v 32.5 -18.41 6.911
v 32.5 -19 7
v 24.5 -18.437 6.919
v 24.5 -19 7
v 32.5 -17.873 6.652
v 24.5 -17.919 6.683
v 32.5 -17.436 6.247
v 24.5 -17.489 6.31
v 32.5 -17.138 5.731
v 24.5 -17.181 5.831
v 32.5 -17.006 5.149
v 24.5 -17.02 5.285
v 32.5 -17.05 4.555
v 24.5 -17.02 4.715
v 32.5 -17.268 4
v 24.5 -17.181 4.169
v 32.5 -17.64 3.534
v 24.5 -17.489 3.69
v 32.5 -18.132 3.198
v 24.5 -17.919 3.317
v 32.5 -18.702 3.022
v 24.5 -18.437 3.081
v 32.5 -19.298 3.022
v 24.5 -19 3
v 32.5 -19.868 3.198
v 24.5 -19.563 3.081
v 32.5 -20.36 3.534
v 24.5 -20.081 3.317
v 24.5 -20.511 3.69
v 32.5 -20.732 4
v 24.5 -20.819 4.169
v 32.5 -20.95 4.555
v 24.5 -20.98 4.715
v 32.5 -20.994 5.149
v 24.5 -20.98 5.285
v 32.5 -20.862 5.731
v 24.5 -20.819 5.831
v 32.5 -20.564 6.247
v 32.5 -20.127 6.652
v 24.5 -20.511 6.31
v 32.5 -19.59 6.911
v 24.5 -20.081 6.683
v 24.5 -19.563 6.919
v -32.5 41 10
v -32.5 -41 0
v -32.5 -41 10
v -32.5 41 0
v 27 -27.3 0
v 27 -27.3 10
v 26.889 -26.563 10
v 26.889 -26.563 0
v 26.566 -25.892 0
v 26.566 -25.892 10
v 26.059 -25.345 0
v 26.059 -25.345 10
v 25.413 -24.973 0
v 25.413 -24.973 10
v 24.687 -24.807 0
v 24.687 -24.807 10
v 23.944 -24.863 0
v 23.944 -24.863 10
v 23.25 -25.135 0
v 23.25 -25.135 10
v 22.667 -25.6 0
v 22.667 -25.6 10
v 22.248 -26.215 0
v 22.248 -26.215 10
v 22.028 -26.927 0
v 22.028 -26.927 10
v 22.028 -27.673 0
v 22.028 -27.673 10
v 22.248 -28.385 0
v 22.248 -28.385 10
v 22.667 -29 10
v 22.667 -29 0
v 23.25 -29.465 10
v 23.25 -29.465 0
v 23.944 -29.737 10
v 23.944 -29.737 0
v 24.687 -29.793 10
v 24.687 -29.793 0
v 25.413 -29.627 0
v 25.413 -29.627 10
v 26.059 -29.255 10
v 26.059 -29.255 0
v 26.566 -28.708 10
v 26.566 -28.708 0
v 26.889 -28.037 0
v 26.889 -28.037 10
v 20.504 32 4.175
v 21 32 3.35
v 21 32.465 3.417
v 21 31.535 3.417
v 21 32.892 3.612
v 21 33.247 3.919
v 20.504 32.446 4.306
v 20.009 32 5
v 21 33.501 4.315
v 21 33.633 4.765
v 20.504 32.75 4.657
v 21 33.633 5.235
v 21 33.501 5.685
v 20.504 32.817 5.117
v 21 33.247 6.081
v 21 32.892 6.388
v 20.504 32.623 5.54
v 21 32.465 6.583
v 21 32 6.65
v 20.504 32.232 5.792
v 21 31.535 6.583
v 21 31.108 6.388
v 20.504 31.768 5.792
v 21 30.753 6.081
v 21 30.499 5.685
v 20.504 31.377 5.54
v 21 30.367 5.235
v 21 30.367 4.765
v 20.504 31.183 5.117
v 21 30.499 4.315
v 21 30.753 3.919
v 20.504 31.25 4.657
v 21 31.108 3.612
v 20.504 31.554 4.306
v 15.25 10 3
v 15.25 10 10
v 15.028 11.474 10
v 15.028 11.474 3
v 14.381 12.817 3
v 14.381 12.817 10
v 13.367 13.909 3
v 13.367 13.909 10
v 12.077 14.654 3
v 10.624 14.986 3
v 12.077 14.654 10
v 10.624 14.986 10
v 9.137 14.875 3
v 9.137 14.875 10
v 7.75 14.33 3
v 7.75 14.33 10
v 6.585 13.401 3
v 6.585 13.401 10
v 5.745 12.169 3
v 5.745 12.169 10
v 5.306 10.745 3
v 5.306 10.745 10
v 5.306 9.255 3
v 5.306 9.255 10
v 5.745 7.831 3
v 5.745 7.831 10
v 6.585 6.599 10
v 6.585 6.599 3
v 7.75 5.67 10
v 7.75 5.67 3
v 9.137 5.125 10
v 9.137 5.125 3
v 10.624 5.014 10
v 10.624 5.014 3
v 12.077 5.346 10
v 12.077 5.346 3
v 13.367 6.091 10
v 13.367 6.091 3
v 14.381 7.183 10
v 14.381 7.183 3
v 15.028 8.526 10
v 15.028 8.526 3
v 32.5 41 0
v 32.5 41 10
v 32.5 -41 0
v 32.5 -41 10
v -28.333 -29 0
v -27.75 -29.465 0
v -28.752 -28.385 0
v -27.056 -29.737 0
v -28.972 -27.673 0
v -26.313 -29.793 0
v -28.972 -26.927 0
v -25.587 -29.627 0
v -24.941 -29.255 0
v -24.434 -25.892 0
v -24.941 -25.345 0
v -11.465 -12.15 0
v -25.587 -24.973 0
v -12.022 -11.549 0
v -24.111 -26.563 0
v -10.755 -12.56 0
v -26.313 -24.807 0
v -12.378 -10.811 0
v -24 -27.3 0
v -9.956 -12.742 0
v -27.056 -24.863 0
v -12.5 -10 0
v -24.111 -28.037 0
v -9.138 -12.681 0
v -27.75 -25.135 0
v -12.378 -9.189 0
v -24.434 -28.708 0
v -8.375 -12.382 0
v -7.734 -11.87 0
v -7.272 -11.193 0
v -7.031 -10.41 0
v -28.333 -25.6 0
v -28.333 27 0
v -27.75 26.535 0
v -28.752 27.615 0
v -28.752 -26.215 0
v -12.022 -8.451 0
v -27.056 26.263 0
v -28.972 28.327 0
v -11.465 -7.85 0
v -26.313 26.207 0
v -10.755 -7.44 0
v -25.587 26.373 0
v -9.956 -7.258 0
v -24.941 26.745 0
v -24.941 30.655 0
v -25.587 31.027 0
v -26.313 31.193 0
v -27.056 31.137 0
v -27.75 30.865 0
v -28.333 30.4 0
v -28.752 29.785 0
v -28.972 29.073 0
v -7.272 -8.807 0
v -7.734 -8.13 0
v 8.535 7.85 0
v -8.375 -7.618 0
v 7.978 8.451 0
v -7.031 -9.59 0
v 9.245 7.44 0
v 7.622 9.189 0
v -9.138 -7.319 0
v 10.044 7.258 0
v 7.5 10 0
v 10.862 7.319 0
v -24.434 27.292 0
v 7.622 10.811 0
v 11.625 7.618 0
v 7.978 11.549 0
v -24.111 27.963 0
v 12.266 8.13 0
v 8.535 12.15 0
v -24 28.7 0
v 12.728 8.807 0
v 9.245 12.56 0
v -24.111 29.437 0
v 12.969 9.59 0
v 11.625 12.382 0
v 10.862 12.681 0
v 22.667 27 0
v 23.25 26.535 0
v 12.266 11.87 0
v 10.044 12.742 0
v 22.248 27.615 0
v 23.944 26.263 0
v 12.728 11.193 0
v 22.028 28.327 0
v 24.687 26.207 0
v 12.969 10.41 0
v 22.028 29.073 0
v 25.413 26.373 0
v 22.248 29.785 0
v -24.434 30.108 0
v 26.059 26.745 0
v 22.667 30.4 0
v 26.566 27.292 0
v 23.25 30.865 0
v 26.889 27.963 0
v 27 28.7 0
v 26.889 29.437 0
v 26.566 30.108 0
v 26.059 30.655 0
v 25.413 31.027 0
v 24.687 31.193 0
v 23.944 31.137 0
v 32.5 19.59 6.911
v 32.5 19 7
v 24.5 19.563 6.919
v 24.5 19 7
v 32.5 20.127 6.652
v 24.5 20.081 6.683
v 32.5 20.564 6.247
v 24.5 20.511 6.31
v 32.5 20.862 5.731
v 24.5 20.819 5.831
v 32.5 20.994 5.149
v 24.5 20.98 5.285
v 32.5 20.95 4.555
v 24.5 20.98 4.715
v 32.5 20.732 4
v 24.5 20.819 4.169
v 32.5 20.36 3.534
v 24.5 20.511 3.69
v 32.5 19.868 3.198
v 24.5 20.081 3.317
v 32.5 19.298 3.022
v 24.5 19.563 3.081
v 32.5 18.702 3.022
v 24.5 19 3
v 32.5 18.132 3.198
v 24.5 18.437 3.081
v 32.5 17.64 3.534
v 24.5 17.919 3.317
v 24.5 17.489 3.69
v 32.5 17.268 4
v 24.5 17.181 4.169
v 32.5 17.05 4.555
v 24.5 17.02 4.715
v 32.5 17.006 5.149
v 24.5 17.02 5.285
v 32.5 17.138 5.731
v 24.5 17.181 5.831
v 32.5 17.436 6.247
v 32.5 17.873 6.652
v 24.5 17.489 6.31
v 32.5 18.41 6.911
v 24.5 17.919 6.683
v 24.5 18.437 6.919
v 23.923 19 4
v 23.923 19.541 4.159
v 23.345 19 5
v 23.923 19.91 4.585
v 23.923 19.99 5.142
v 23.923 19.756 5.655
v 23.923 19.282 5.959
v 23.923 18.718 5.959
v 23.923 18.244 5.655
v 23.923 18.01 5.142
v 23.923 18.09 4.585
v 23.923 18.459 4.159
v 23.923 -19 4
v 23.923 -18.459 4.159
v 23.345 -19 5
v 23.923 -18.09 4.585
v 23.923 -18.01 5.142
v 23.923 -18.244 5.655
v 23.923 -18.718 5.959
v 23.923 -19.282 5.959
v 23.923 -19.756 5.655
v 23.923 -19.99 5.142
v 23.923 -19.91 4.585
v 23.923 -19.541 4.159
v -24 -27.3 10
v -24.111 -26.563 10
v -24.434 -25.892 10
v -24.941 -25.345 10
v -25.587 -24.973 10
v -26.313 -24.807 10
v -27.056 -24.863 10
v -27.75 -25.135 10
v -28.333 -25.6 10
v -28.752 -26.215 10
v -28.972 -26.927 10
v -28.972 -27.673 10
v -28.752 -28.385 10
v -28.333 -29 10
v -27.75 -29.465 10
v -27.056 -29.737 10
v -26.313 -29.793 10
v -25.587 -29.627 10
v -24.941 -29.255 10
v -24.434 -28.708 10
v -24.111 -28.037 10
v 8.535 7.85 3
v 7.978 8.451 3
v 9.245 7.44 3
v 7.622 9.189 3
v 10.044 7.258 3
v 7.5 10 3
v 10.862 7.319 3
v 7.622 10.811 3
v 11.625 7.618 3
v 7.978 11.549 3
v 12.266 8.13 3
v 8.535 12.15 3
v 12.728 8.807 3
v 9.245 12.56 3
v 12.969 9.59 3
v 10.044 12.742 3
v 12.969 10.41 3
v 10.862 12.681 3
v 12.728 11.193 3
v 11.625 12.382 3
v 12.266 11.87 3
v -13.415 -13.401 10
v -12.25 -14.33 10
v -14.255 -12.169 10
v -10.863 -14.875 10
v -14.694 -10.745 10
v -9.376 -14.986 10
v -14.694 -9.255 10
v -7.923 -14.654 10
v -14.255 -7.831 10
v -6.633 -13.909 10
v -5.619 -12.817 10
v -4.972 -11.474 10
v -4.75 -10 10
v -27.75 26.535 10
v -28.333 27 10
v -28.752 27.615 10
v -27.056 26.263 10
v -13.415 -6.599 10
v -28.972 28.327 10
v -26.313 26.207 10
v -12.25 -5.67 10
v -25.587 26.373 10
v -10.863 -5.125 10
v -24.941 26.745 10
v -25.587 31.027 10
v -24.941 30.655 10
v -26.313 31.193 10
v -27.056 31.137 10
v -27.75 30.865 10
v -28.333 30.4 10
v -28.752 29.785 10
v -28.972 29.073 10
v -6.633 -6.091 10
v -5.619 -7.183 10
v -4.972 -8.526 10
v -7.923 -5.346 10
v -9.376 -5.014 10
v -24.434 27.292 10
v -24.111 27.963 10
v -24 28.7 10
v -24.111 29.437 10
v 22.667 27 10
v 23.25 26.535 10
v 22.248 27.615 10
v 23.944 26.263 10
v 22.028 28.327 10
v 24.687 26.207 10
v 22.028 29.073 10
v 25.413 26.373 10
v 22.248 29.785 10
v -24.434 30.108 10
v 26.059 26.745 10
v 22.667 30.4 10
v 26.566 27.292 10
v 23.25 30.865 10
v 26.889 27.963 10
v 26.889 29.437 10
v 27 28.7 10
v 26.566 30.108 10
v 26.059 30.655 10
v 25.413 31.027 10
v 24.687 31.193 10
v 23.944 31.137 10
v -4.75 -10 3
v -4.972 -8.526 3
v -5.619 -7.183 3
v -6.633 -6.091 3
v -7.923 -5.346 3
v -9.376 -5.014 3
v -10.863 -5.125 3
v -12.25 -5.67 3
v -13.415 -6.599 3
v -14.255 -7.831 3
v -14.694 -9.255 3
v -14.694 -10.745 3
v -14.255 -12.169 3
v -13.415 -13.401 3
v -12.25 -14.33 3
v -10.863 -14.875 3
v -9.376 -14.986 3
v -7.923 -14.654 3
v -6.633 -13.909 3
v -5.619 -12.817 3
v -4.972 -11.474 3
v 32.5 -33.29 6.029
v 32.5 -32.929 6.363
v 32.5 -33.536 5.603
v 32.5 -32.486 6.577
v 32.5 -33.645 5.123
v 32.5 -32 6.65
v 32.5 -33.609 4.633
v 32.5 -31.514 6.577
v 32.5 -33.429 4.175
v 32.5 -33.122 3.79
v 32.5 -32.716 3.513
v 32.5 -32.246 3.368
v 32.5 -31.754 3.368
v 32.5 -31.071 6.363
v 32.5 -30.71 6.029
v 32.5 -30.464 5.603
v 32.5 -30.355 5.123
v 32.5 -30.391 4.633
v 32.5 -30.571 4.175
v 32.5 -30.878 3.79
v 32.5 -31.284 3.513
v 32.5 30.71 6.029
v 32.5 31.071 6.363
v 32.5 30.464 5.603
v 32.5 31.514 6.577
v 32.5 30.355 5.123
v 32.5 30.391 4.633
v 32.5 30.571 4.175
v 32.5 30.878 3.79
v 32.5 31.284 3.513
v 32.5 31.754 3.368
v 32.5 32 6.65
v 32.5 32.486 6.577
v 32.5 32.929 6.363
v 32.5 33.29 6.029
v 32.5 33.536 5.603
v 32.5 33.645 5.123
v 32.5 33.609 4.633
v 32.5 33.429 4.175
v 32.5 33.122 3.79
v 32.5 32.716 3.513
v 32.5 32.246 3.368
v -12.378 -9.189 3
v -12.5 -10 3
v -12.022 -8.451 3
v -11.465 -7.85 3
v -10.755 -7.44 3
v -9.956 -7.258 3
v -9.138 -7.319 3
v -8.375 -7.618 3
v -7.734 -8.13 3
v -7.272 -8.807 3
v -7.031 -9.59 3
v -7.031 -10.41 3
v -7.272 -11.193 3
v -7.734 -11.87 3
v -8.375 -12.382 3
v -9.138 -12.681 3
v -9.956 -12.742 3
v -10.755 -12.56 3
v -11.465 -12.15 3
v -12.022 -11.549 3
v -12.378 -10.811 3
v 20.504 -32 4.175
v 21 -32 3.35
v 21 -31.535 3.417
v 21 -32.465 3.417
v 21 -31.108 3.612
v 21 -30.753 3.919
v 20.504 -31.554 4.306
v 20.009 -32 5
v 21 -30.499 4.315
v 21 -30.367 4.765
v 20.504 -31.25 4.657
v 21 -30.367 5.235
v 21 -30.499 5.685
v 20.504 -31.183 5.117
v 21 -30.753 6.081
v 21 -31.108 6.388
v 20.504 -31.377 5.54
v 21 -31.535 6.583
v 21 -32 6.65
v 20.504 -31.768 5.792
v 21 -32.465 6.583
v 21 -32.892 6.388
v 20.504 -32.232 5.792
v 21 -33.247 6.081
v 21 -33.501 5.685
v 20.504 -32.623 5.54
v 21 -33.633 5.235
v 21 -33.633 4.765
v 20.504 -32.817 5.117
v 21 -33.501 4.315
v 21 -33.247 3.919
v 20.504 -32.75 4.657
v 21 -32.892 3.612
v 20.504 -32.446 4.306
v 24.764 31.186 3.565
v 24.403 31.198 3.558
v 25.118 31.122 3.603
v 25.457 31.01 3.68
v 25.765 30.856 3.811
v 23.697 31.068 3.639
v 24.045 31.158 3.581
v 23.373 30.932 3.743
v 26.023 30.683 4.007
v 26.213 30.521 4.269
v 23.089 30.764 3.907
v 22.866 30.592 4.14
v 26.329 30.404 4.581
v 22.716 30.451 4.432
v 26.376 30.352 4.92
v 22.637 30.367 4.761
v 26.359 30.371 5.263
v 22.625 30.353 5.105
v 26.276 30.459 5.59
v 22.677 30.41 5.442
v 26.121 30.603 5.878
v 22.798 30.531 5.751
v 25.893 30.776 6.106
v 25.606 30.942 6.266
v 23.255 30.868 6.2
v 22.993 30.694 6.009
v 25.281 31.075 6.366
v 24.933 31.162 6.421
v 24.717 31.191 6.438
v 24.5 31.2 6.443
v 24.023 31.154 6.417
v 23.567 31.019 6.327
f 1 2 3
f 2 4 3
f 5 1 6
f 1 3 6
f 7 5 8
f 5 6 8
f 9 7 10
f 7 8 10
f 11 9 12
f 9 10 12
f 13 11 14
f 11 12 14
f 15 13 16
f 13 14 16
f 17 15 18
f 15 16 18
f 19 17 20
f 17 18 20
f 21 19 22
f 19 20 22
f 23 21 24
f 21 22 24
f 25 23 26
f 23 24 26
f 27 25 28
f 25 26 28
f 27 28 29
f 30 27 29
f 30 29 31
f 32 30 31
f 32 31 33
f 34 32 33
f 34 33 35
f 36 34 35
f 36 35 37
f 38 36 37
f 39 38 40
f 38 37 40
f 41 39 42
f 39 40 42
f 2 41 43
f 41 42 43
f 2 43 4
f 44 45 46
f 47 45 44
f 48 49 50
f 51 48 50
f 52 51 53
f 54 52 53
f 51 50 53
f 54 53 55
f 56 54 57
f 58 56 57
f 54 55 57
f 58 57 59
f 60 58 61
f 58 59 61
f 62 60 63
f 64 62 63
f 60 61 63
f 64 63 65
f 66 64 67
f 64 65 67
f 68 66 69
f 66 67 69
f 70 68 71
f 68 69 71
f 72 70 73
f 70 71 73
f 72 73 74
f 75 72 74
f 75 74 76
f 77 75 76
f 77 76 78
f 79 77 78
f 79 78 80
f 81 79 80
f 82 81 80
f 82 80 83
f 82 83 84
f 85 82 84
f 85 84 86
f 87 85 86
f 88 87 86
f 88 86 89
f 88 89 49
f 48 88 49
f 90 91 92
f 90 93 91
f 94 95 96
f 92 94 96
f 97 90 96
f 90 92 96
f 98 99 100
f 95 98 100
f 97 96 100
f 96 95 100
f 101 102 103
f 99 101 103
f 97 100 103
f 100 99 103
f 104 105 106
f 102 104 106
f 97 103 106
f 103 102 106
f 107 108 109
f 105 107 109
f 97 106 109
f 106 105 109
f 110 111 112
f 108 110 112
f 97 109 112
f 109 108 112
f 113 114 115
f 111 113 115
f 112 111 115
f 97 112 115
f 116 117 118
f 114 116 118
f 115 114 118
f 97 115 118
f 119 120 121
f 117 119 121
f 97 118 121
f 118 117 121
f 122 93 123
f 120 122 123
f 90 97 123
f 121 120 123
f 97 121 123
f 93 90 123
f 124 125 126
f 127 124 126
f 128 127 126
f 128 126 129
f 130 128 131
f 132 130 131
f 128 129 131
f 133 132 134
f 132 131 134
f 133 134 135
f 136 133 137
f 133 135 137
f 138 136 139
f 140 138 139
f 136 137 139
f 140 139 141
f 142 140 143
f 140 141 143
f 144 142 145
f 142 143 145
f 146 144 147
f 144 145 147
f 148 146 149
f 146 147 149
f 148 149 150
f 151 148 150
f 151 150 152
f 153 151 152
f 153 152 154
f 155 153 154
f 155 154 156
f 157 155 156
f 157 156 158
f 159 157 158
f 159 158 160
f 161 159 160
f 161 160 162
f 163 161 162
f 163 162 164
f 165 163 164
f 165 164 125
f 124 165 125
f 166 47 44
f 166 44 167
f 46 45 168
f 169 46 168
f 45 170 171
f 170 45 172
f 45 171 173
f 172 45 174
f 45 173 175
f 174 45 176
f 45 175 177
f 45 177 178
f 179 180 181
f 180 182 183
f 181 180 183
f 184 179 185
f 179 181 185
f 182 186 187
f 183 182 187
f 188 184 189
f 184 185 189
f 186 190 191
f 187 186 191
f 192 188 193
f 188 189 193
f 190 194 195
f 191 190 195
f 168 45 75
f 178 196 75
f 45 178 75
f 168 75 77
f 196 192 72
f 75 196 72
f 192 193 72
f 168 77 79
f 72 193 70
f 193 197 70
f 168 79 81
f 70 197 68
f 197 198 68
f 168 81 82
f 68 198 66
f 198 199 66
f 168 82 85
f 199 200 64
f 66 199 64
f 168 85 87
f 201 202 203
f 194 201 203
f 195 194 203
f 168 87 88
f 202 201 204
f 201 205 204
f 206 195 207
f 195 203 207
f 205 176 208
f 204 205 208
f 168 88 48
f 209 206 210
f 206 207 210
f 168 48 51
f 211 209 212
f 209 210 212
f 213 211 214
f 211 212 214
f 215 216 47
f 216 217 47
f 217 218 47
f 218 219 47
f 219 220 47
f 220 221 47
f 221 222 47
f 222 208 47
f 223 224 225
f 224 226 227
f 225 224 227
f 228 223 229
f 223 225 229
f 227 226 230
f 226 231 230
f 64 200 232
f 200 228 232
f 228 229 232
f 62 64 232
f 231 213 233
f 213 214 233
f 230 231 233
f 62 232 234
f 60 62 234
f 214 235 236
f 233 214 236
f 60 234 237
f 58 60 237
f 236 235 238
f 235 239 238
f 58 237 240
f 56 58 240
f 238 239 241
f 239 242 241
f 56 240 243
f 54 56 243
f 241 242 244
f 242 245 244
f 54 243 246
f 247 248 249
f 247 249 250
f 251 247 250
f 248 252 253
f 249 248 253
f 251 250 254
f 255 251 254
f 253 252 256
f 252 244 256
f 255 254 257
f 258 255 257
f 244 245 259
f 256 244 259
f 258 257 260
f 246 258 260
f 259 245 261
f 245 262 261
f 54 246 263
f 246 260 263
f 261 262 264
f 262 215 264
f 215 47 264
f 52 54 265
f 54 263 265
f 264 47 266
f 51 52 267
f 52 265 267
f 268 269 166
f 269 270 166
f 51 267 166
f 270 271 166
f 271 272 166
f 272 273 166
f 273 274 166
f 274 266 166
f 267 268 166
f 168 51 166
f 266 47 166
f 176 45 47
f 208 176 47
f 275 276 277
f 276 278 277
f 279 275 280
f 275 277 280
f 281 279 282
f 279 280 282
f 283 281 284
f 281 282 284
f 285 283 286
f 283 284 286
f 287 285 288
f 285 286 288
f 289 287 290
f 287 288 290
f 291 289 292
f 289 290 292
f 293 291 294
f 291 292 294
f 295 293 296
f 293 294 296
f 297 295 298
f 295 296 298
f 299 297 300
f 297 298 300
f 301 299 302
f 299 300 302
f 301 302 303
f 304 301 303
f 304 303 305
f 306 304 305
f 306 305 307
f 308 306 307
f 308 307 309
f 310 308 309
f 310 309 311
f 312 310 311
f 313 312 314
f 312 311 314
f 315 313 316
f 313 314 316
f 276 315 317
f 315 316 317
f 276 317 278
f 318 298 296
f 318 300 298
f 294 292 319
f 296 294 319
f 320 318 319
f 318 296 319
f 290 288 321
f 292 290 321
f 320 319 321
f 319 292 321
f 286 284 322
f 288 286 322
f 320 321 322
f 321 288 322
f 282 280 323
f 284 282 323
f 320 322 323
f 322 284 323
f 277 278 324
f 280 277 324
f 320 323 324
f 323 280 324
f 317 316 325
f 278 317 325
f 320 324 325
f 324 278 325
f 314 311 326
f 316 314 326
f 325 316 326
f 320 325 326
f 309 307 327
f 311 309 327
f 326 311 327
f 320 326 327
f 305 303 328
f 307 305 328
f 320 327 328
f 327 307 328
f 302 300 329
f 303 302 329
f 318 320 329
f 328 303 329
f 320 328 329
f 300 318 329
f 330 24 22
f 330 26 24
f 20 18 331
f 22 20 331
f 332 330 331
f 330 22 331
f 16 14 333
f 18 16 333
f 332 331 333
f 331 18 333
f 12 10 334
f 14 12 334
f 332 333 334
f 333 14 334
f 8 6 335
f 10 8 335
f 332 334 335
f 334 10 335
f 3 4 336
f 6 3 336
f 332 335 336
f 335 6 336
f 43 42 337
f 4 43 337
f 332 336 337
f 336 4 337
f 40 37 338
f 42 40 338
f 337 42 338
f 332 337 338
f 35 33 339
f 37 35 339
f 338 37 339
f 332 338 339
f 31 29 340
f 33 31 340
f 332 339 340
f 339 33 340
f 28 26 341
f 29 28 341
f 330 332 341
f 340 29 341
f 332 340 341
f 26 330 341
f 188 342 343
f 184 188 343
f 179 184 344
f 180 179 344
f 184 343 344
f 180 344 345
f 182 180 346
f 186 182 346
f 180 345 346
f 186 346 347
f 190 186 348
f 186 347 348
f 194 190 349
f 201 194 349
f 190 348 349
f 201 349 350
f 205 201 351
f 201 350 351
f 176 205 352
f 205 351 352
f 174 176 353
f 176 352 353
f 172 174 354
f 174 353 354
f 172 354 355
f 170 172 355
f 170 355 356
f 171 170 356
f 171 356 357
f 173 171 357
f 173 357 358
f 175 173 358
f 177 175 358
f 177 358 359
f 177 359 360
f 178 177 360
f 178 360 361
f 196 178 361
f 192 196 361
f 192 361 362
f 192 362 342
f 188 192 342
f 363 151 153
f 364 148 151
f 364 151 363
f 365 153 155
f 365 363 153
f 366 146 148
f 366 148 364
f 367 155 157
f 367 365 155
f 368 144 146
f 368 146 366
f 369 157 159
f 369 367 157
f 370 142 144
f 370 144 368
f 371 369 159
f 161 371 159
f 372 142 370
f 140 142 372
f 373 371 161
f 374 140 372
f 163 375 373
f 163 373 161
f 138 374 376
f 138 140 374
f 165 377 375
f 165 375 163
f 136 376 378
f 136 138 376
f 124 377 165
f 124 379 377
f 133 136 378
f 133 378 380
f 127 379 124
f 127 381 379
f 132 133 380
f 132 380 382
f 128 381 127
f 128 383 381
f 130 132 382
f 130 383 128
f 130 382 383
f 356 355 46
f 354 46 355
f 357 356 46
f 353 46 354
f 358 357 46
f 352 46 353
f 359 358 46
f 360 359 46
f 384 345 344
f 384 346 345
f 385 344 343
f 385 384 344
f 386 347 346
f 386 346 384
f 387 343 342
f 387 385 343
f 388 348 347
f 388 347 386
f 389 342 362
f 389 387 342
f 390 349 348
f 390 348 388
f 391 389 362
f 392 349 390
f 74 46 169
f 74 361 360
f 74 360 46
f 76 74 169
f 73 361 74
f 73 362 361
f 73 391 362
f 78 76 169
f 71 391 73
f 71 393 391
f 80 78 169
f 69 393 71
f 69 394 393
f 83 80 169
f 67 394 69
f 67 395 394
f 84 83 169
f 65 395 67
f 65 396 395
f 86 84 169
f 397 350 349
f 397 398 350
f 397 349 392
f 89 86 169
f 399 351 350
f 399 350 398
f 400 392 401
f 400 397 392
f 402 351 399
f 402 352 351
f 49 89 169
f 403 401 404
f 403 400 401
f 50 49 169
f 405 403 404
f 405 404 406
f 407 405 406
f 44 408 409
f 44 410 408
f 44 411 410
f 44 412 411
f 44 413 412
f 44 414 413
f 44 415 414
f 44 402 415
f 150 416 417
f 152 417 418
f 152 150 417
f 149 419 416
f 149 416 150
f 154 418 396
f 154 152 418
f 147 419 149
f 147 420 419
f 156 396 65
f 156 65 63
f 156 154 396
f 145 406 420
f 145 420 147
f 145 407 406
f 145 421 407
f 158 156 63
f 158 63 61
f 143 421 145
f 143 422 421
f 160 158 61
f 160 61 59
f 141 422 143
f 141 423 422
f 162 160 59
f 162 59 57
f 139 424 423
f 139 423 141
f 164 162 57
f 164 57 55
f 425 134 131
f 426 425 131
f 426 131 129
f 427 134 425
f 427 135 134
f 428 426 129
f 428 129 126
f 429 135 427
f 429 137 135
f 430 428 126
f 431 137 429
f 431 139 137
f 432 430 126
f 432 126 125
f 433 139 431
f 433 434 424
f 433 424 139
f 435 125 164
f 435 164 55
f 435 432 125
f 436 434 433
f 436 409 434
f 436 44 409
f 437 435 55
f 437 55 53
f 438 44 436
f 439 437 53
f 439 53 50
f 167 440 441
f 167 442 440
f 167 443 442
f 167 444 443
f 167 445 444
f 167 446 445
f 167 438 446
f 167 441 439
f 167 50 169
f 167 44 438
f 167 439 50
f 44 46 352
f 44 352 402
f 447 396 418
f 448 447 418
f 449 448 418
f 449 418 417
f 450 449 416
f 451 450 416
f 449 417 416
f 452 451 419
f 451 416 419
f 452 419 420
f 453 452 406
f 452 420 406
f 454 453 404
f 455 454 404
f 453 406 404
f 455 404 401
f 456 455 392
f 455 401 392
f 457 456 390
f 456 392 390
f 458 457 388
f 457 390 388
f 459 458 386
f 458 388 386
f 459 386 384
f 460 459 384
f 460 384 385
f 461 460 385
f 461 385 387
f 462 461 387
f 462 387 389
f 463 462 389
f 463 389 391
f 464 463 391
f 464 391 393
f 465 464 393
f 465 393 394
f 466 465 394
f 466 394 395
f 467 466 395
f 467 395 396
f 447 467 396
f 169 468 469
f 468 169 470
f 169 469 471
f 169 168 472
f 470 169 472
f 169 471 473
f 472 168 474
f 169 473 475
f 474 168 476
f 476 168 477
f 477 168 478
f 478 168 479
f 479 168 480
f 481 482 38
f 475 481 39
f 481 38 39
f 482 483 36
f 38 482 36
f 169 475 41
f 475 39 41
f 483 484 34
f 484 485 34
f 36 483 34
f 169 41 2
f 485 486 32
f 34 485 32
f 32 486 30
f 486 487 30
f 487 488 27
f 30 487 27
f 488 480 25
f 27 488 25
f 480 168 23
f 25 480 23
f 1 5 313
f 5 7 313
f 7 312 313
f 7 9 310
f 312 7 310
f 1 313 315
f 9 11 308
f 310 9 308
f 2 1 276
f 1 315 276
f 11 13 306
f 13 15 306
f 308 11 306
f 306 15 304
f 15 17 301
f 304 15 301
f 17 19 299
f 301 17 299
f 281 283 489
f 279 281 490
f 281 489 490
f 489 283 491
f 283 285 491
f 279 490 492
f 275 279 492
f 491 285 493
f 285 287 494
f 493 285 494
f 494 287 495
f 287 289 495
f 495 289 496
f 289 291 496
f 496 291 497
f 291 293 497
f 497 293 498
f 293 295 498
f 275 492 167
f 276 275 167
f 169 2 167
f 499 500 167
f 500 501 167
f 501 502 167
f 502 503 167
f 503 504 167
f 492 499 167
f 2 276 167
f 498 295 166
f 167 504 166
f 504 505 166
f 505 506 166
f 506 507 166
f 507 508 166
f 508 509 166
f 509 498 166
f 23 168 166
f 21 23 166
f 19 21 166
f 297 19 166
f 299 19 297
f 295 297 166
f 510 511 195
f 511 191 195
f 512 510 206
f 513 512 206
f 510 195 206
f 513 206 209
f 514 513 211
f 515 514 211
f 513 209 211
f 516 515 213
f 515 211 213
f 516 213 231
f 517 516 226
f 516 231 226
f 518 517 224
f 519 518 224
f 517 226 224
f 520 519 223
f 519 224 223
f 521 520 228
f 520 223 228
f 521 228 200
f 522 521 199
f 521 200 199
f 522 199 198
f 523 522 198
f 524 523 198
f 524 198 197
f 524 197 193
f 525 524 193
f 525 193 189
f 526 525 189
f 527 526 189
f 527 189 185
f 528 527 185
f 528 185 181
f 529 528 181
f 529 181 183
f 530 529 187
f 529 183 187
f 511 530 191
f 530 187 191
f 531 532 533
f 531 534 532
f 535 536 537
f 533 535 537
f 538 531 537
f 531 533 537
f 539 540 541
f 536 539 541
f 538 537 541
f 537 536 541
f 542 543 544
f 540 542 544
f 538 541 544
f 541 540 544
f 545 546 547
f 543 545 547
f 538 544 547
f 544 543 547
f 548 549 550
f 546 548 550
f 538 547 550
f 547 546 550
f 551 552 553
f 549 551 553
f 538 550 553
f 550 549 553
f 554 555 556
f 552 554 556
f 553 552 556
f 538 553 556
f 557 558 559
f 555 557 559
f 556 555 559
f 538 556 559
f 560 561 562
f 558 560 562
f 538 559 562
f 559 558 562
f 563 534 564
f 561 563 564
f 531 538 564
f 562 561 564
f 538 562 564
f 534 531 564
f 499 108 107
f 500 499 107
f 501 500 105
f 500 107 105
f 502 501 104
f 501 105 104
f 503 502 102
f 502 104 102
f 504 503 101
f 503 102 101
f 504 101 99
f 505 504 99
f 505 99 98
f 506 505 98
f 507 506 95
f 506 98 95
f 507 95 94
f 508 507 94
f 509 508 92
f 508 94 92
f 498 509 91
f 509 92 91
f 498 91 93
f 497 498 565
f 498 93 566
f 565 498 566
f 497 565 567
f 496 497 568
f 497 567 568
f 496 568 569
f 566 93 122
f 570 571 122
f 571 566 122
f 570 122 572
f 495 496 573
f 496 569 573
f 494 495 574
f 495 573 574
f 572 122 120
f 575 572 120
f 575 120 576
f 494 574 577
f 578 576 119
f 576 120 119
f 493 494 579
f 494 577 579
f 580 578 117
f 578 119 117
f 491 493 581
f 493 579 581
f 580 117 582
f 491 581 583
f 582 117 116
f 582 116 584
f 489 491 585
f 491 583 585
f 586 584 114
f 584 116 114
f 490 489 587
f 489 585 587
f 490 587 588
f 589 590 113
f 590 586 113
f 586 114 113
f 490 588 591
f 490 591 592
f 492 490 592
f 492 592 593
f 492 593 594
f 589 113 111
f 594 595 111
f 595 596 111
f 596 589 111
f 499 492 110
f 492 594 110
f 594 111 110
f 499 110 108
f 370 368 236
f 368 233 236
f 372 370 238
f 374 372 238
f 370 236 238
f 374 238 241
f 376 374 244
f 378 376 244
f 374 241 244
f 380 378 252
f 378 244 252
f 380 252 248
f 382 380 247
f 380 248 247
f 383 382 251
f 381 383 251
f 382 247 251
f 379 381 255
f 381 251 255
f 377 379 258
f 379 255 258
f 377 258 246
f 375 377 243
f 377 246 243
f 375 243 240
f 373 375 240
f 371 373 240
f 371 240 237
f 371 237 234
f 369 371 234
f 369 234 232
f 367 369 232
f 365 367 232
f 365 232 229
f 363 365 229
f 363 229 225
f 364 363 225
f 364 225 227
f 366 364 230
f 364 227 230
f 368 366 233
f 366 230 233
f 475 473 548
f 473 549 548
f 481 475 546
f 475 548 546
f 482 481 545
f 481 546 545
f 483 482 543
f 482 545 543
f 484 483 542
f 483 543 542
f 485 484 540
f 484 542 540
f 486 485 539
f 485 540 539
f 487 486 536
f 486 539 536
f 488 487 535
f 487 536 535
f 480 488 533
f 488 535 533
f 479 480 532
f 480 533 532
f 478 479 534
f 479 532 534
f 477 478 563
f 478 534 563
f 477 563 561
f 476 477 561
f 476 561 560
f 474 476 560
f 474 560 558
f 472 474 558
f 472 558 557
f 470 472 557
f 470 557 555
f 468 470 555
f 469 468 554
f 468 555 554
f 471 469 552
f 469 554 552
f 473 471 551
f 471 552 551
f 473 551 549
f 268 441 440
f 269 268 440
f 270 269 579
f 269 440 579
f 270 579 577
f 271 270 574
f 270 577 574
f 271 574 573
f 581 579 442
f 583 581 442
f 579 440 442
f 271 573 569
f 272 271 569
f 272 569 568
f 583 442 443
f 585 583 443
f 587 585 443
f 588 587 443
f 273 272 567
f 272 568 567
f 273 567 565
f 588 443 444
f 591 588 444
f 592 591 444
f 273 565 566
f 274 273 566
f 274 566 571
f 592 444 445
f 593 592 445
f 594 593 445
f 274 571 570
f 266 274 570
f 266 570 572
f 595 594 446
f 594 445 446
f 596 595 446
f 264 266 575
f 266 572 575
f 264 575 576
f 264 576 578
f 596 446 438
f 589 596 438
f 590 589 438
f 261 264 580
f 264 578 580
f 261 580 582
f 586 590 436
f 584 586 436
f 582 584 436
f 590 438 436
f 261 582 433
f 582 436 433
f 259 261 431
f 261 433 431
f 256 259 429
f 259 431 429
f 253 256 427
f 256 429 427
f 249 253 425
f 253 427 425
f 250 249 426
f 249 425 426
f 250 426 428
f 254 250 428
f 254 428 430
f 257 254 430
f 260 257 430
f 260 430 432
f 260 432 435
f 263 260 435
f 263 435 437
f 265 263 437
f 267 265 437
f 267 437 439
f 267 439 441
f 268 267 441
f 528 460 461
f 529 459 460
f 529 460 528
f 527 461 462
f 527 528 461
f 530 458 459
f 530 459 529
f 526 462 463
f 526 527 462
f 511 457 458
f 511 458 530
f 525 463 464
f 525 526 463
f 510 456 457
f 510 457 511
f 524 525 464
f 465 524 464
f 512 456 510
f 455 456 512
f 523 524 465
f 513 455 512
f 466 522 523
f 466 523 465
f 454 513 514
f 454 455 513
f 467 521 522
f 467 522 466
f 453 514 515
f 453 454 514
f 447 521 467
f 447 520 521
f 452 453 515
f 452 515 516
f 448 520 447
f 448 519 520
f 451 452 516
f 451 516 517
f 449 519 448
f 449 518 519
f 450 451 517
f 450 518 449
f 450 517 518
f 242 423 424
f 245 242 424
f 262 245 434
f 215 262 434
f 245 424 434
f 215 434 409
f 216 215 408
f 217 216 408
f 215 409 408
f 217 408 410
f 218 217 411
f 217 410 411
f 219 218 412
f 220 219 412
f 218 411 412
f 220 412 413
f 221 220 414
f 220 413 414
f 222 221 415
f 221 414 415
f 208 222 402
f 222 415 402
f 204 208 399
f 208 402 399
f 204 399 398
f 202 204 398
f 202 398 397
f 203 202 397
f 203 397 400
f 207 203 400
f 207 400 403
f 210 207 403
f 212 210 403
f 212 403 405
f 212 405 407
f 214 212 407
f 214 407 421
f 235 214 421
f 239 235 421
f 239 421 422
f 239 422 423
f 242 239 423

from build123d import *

# Parameters (mm, degrees)
ESQUISSE1_W                                        = 65
ESQUISSE1_H                                        = 82
BOSS_EXTRU_1_DEPTH                                 = 10
CHAMBRAGE_POUR_VIS_T_TE_HEXAGONALE_M51_D           = 5.5
CHAMBRAGE_POUR_VIS_T_TE_HEXAGONALE_M51_CBORE_D     = 10
CHAMBRAGE_POUR_VIS_T_TE_HEXAGONALE_M51_CBORE_DEPTH = 7
TROU_TARAUD_M42_D                                  = 3.3
TROU_TARAUD_M42_DEPTH                              = 11.5
TROU_TARAUD_M42_TIP                                = 0.991420021
TROUS_DE_CENTRAGE_4_0MMTRANSITIONAL_1_D            = 4
TROUS_DE_CENTRAGE_4_0MMTRANSITIONAL_1_DEPTH        = 8
TROUS_DE_CENTRAGE_4_0MMTRANSITIONAL_1_TIP          = 1.154700538
TROU_TARAUD_M61_D                                  = 5


with BuildPart() as part:
    # Esquisse1 → Boss.-Extru.1 (new body)
    with BuildSketch(Plane.XY):
        Rectangle(ESQUISSE1_W, ESQUISSE1_H)
    extrude(amount=BOSS_EXTRU_1_DEPTH)

    # Chambrage pour vis à tête hexagonale M51 (through all)
    with Locations(Plane.XY.offset(10)):
        with Locations((10.25, 10), (-9.75, -10)):
            CounterBoreHole(CHAMBRAGE_POUR_VIS_T_TE_HEXAGONALE_M51_D / 2, CHAMBRAGE_POUR_VIS_T_TE_HEXAGONALE_M51_CBORE_D / 2, CHAMBRAGE_POUR_VIS_T_TE_HEXAGONALE_M51_CBORE_DEPTH)

    # Trou taraudé M42
    with Locations(Plane(origin=(32.5, 0, 0), x_dir=(0, 0, -1), z_dir=(1, 0, 0))):
        with Locations((-5, -32), (-5, 32)):
            Hole(TROU_TARAUD_M42_D / 2, depth=TROU_TARAUD_M42_DEPTH)
            with Locations((0, 0, -(TROU_TARAUD_M42_DEPTH + TROU_TARAUD_M42_TIP / 2))):  # 118° drill point
                Cone(0, TROU_TARAUD_M42_D / 2, TROU_TARAUD_M42_TIP, mode=Mode.SUBTRACT)

    # Trous de centrage Ø4.0mmTransitional 1
    with Locations(Plane(origin=(32.5, 0, 0), x_dir=(0, 0, -1), z_dir=(1, 0, 0))):
        with Locations((-5, -19), (-5, 19)):
            Hole(TROUS_DE_CENTRAGE_4_0MMTRANSITIONAL_1_D / 2, depth=TROUS_DE_CENTRAGE_4_0MMTRANSITIONAL_1_DEPTH)
            with Locations((0, 0, -(TROUS_DE_CENTRAGE_4_0MMTRANSITIONAL_1_DEPTH + TROUS_DE_CENTRAGE_4_0MMTRANSITIONAL_1_TIP / 2))):  # 120° drill point
                Cone(0, TROUS_DE_CENTRAGE_4_0MMTRANSITIONAL_1_D / 2, TROUS_DE_CENTRAGE_4_0MMTRANSITIONAL_1_TIP, mode=Mode.SUBTRACT)

    # Trou taraudé M61 (through all)
    with Locations(Plane(origin=(0, 0, 0), x_dir=(-1, 0, 0), z_dir=(0, 0, -1))):
        with Locations((26.5, 28.7), (-24.5, 28.7), (-24.5, -27.3), (26.5, -27.3)):
            Hole(TROU_TARAUD_M61_D / 2)


solid = part.part
